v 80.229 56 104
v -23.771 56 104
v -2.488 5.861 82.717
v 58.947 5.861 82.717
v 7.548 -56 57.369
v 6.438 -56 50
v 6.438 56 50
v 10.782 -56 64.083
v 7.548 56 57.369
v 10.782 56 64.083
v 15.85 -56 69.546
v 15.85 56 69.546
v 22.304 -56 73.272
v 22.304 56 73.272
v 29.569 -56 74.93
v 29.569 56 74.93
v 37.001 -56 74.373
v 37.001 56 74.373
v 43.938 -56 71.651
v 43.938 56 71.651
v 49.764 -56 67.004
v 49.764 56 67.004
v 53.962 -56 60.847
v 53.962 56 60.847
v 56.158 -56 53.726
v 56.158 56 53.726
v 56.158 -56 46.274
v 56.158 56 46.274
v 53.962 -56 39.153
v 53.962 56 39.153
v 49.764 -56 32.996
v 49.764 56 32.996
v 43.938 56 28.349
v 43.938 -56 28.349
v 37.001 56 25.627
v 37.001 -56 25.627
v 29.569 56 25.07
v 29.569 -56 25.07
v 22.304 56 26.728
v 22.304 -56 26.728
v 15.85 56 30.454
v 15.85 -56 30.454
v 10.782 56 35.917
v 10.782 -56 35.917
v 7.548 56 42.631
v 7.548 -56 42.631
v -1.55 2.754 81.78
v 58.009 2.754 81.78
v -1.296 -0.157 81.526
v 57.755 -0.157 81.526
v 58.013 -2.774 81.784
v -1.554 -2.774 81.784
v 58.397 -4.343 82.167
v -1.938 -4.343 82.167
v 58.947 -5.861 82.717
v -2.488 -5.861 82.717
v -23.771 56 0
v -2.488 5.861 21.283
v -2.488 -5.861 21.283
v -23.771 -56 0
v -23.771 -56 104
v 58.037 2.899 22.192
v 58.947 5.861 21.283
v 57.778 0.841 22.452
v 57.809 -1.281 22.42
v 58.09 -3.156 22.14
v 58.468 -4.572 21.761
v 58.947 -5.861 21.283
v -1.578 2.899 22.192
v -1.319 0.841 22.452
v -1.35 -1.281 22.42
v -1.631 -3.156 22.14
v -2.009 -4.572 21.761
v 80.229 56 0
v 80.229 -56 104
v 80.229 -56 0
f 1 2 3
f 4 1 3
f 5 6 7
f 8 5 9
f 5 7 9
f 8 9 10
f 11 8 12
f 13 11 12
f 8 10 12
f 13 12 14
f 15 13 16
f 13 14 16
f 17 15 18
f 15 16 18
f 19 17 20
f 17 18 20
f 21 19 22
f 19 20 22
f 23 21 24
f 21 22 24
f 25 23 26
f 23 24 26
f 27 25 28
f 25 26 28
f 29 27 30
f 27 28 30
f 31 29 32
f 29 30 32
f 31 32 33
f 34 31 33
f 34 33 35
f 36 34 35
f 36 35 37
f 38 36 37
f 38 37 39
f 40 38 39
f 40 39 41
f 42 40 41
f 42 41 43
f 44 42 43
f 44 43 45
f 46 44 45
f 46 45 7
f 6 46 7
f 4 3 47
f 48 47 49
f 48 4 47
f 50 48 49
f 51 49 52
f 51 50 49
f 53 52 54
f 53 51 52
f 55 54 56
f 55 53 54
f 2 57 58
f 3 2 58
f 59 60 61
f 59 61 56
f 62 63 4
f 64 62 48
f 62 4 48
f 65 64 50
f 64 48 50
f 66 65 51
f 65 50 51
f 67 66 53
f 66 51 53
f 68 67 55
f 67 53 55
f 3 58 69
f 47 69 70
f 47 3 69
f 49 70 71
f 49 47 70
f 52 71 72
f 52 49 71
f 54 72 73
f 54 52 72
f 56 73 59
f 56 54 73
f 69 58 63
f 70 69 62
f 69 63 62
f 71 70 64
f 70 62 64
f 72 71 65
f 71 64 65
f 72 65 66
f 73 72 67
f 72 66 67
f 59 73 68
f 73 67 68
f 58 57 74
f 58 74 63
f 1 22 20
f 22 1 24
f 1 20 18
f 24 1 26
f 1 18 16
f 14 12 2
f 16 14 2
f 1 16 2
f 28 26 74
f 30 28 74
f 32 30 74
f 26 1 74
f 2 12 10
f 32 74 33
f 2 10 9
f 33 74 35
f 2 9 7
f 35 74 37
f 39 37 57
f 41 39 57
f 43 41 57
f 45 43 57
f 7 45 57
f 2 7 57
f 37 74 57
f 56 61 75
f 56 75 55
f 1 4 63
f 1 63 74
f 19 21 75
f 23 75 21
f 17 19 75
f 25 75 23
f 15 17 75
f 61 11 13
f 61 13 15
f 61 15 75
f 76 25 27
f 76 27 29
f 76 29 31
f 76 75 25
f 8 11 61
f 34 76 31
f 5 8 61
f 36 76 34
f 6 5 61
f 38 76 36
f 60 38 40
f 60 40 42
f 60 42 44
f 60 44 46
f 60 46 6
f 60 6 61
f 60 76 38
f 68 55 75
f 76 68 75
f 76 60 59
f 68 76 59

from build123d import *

# Parameters (mm, degrees)
BOSS_EXTRU_1_DEPTH           = 104
ENL_V_MAT_EXTRU_1_DEPTH      = 143.789209242
ENL_V_MAT_EXTRU_1_DEPTH_BACK = 143.789209242
ESQUISSE4_R                  = 25
ENL_V_MAT_EXTRU_2_DEPTH      = 173.617375359
CONG_1_R                     = 15


with BuildPart() as part:
    # Esquisse1 → Boss.-Extru.1 (new body)
    with BuildSketch(Plane.XY):
        Polygon((80.229410292, 56), (-23.770589708, 56), (0, 0), (56.458820585, 0), align=None)
        Polygon((-23.770589708, -56), (0, 0), (56.458820585, 0), (80.229410292, -56), align=None)
    extrude(amount=BOSS_EXTRU_1_DEPTH)

    # Esquisse3 → Enlèv. mat.-Extru.1 (cut, two sides: drawn at the far end of the back side and taken through both)
    with BuildSketch(Plane(origin=(0, 0, 0), x_dir=(0, 0, -1), z_dir=(1, 0, 0)).offset(-ENL_V_MAT_EXTRU_1_DEPTH_BACK)):
        Polygon((-23.770589708, 0), (0, 0), (0, 56), align=None)
        Polygon((0, 0), (0, -56), (-23.770589708, 0), align=None)
        Polygon((-104, 0), (-104, 56), (-80.229410292, 0), align=None)
        Polygon((-80.229410292, 0), (-104, 0), (-104, -56), align=None)
    extrude(amount=ENL_V_MAT_EXTRU_1_DEPTH + ENL_V_MAT_EXTRU_1_DEPTH_BACK, mode=Mode.SUBTRACT)

    # Esquisse4 → Enlèv. mat.-Extru.2 (cut, through all)
    with BuildSketch(Plane(origin=(0, 56, 0), x_dir=(1, 0, 0), z_dir=(0, 1, 0))):
        with Locations(Location((31.437518052, -50, 0), (0, 0, 180))):
            Circle(ESQUISSE4_R)
    extrude(amount=-ENL_V_MAT_EXTRU_2_DEPTH, mode=Mode.SUBTRACT)

    # Congé1
    cong_1_edges = [part.edges().sort_by_distance(p)[0] for p in [
        (56.458820585, 0, 52),
        (0, 0, 52),
        (28.229410292, 0, 23.770589708),
        (28.229410292, 0, 80.229410292),
    ]]
    fillet(cong_1_edges, radius=CONG_1_R)


solid = part.part
